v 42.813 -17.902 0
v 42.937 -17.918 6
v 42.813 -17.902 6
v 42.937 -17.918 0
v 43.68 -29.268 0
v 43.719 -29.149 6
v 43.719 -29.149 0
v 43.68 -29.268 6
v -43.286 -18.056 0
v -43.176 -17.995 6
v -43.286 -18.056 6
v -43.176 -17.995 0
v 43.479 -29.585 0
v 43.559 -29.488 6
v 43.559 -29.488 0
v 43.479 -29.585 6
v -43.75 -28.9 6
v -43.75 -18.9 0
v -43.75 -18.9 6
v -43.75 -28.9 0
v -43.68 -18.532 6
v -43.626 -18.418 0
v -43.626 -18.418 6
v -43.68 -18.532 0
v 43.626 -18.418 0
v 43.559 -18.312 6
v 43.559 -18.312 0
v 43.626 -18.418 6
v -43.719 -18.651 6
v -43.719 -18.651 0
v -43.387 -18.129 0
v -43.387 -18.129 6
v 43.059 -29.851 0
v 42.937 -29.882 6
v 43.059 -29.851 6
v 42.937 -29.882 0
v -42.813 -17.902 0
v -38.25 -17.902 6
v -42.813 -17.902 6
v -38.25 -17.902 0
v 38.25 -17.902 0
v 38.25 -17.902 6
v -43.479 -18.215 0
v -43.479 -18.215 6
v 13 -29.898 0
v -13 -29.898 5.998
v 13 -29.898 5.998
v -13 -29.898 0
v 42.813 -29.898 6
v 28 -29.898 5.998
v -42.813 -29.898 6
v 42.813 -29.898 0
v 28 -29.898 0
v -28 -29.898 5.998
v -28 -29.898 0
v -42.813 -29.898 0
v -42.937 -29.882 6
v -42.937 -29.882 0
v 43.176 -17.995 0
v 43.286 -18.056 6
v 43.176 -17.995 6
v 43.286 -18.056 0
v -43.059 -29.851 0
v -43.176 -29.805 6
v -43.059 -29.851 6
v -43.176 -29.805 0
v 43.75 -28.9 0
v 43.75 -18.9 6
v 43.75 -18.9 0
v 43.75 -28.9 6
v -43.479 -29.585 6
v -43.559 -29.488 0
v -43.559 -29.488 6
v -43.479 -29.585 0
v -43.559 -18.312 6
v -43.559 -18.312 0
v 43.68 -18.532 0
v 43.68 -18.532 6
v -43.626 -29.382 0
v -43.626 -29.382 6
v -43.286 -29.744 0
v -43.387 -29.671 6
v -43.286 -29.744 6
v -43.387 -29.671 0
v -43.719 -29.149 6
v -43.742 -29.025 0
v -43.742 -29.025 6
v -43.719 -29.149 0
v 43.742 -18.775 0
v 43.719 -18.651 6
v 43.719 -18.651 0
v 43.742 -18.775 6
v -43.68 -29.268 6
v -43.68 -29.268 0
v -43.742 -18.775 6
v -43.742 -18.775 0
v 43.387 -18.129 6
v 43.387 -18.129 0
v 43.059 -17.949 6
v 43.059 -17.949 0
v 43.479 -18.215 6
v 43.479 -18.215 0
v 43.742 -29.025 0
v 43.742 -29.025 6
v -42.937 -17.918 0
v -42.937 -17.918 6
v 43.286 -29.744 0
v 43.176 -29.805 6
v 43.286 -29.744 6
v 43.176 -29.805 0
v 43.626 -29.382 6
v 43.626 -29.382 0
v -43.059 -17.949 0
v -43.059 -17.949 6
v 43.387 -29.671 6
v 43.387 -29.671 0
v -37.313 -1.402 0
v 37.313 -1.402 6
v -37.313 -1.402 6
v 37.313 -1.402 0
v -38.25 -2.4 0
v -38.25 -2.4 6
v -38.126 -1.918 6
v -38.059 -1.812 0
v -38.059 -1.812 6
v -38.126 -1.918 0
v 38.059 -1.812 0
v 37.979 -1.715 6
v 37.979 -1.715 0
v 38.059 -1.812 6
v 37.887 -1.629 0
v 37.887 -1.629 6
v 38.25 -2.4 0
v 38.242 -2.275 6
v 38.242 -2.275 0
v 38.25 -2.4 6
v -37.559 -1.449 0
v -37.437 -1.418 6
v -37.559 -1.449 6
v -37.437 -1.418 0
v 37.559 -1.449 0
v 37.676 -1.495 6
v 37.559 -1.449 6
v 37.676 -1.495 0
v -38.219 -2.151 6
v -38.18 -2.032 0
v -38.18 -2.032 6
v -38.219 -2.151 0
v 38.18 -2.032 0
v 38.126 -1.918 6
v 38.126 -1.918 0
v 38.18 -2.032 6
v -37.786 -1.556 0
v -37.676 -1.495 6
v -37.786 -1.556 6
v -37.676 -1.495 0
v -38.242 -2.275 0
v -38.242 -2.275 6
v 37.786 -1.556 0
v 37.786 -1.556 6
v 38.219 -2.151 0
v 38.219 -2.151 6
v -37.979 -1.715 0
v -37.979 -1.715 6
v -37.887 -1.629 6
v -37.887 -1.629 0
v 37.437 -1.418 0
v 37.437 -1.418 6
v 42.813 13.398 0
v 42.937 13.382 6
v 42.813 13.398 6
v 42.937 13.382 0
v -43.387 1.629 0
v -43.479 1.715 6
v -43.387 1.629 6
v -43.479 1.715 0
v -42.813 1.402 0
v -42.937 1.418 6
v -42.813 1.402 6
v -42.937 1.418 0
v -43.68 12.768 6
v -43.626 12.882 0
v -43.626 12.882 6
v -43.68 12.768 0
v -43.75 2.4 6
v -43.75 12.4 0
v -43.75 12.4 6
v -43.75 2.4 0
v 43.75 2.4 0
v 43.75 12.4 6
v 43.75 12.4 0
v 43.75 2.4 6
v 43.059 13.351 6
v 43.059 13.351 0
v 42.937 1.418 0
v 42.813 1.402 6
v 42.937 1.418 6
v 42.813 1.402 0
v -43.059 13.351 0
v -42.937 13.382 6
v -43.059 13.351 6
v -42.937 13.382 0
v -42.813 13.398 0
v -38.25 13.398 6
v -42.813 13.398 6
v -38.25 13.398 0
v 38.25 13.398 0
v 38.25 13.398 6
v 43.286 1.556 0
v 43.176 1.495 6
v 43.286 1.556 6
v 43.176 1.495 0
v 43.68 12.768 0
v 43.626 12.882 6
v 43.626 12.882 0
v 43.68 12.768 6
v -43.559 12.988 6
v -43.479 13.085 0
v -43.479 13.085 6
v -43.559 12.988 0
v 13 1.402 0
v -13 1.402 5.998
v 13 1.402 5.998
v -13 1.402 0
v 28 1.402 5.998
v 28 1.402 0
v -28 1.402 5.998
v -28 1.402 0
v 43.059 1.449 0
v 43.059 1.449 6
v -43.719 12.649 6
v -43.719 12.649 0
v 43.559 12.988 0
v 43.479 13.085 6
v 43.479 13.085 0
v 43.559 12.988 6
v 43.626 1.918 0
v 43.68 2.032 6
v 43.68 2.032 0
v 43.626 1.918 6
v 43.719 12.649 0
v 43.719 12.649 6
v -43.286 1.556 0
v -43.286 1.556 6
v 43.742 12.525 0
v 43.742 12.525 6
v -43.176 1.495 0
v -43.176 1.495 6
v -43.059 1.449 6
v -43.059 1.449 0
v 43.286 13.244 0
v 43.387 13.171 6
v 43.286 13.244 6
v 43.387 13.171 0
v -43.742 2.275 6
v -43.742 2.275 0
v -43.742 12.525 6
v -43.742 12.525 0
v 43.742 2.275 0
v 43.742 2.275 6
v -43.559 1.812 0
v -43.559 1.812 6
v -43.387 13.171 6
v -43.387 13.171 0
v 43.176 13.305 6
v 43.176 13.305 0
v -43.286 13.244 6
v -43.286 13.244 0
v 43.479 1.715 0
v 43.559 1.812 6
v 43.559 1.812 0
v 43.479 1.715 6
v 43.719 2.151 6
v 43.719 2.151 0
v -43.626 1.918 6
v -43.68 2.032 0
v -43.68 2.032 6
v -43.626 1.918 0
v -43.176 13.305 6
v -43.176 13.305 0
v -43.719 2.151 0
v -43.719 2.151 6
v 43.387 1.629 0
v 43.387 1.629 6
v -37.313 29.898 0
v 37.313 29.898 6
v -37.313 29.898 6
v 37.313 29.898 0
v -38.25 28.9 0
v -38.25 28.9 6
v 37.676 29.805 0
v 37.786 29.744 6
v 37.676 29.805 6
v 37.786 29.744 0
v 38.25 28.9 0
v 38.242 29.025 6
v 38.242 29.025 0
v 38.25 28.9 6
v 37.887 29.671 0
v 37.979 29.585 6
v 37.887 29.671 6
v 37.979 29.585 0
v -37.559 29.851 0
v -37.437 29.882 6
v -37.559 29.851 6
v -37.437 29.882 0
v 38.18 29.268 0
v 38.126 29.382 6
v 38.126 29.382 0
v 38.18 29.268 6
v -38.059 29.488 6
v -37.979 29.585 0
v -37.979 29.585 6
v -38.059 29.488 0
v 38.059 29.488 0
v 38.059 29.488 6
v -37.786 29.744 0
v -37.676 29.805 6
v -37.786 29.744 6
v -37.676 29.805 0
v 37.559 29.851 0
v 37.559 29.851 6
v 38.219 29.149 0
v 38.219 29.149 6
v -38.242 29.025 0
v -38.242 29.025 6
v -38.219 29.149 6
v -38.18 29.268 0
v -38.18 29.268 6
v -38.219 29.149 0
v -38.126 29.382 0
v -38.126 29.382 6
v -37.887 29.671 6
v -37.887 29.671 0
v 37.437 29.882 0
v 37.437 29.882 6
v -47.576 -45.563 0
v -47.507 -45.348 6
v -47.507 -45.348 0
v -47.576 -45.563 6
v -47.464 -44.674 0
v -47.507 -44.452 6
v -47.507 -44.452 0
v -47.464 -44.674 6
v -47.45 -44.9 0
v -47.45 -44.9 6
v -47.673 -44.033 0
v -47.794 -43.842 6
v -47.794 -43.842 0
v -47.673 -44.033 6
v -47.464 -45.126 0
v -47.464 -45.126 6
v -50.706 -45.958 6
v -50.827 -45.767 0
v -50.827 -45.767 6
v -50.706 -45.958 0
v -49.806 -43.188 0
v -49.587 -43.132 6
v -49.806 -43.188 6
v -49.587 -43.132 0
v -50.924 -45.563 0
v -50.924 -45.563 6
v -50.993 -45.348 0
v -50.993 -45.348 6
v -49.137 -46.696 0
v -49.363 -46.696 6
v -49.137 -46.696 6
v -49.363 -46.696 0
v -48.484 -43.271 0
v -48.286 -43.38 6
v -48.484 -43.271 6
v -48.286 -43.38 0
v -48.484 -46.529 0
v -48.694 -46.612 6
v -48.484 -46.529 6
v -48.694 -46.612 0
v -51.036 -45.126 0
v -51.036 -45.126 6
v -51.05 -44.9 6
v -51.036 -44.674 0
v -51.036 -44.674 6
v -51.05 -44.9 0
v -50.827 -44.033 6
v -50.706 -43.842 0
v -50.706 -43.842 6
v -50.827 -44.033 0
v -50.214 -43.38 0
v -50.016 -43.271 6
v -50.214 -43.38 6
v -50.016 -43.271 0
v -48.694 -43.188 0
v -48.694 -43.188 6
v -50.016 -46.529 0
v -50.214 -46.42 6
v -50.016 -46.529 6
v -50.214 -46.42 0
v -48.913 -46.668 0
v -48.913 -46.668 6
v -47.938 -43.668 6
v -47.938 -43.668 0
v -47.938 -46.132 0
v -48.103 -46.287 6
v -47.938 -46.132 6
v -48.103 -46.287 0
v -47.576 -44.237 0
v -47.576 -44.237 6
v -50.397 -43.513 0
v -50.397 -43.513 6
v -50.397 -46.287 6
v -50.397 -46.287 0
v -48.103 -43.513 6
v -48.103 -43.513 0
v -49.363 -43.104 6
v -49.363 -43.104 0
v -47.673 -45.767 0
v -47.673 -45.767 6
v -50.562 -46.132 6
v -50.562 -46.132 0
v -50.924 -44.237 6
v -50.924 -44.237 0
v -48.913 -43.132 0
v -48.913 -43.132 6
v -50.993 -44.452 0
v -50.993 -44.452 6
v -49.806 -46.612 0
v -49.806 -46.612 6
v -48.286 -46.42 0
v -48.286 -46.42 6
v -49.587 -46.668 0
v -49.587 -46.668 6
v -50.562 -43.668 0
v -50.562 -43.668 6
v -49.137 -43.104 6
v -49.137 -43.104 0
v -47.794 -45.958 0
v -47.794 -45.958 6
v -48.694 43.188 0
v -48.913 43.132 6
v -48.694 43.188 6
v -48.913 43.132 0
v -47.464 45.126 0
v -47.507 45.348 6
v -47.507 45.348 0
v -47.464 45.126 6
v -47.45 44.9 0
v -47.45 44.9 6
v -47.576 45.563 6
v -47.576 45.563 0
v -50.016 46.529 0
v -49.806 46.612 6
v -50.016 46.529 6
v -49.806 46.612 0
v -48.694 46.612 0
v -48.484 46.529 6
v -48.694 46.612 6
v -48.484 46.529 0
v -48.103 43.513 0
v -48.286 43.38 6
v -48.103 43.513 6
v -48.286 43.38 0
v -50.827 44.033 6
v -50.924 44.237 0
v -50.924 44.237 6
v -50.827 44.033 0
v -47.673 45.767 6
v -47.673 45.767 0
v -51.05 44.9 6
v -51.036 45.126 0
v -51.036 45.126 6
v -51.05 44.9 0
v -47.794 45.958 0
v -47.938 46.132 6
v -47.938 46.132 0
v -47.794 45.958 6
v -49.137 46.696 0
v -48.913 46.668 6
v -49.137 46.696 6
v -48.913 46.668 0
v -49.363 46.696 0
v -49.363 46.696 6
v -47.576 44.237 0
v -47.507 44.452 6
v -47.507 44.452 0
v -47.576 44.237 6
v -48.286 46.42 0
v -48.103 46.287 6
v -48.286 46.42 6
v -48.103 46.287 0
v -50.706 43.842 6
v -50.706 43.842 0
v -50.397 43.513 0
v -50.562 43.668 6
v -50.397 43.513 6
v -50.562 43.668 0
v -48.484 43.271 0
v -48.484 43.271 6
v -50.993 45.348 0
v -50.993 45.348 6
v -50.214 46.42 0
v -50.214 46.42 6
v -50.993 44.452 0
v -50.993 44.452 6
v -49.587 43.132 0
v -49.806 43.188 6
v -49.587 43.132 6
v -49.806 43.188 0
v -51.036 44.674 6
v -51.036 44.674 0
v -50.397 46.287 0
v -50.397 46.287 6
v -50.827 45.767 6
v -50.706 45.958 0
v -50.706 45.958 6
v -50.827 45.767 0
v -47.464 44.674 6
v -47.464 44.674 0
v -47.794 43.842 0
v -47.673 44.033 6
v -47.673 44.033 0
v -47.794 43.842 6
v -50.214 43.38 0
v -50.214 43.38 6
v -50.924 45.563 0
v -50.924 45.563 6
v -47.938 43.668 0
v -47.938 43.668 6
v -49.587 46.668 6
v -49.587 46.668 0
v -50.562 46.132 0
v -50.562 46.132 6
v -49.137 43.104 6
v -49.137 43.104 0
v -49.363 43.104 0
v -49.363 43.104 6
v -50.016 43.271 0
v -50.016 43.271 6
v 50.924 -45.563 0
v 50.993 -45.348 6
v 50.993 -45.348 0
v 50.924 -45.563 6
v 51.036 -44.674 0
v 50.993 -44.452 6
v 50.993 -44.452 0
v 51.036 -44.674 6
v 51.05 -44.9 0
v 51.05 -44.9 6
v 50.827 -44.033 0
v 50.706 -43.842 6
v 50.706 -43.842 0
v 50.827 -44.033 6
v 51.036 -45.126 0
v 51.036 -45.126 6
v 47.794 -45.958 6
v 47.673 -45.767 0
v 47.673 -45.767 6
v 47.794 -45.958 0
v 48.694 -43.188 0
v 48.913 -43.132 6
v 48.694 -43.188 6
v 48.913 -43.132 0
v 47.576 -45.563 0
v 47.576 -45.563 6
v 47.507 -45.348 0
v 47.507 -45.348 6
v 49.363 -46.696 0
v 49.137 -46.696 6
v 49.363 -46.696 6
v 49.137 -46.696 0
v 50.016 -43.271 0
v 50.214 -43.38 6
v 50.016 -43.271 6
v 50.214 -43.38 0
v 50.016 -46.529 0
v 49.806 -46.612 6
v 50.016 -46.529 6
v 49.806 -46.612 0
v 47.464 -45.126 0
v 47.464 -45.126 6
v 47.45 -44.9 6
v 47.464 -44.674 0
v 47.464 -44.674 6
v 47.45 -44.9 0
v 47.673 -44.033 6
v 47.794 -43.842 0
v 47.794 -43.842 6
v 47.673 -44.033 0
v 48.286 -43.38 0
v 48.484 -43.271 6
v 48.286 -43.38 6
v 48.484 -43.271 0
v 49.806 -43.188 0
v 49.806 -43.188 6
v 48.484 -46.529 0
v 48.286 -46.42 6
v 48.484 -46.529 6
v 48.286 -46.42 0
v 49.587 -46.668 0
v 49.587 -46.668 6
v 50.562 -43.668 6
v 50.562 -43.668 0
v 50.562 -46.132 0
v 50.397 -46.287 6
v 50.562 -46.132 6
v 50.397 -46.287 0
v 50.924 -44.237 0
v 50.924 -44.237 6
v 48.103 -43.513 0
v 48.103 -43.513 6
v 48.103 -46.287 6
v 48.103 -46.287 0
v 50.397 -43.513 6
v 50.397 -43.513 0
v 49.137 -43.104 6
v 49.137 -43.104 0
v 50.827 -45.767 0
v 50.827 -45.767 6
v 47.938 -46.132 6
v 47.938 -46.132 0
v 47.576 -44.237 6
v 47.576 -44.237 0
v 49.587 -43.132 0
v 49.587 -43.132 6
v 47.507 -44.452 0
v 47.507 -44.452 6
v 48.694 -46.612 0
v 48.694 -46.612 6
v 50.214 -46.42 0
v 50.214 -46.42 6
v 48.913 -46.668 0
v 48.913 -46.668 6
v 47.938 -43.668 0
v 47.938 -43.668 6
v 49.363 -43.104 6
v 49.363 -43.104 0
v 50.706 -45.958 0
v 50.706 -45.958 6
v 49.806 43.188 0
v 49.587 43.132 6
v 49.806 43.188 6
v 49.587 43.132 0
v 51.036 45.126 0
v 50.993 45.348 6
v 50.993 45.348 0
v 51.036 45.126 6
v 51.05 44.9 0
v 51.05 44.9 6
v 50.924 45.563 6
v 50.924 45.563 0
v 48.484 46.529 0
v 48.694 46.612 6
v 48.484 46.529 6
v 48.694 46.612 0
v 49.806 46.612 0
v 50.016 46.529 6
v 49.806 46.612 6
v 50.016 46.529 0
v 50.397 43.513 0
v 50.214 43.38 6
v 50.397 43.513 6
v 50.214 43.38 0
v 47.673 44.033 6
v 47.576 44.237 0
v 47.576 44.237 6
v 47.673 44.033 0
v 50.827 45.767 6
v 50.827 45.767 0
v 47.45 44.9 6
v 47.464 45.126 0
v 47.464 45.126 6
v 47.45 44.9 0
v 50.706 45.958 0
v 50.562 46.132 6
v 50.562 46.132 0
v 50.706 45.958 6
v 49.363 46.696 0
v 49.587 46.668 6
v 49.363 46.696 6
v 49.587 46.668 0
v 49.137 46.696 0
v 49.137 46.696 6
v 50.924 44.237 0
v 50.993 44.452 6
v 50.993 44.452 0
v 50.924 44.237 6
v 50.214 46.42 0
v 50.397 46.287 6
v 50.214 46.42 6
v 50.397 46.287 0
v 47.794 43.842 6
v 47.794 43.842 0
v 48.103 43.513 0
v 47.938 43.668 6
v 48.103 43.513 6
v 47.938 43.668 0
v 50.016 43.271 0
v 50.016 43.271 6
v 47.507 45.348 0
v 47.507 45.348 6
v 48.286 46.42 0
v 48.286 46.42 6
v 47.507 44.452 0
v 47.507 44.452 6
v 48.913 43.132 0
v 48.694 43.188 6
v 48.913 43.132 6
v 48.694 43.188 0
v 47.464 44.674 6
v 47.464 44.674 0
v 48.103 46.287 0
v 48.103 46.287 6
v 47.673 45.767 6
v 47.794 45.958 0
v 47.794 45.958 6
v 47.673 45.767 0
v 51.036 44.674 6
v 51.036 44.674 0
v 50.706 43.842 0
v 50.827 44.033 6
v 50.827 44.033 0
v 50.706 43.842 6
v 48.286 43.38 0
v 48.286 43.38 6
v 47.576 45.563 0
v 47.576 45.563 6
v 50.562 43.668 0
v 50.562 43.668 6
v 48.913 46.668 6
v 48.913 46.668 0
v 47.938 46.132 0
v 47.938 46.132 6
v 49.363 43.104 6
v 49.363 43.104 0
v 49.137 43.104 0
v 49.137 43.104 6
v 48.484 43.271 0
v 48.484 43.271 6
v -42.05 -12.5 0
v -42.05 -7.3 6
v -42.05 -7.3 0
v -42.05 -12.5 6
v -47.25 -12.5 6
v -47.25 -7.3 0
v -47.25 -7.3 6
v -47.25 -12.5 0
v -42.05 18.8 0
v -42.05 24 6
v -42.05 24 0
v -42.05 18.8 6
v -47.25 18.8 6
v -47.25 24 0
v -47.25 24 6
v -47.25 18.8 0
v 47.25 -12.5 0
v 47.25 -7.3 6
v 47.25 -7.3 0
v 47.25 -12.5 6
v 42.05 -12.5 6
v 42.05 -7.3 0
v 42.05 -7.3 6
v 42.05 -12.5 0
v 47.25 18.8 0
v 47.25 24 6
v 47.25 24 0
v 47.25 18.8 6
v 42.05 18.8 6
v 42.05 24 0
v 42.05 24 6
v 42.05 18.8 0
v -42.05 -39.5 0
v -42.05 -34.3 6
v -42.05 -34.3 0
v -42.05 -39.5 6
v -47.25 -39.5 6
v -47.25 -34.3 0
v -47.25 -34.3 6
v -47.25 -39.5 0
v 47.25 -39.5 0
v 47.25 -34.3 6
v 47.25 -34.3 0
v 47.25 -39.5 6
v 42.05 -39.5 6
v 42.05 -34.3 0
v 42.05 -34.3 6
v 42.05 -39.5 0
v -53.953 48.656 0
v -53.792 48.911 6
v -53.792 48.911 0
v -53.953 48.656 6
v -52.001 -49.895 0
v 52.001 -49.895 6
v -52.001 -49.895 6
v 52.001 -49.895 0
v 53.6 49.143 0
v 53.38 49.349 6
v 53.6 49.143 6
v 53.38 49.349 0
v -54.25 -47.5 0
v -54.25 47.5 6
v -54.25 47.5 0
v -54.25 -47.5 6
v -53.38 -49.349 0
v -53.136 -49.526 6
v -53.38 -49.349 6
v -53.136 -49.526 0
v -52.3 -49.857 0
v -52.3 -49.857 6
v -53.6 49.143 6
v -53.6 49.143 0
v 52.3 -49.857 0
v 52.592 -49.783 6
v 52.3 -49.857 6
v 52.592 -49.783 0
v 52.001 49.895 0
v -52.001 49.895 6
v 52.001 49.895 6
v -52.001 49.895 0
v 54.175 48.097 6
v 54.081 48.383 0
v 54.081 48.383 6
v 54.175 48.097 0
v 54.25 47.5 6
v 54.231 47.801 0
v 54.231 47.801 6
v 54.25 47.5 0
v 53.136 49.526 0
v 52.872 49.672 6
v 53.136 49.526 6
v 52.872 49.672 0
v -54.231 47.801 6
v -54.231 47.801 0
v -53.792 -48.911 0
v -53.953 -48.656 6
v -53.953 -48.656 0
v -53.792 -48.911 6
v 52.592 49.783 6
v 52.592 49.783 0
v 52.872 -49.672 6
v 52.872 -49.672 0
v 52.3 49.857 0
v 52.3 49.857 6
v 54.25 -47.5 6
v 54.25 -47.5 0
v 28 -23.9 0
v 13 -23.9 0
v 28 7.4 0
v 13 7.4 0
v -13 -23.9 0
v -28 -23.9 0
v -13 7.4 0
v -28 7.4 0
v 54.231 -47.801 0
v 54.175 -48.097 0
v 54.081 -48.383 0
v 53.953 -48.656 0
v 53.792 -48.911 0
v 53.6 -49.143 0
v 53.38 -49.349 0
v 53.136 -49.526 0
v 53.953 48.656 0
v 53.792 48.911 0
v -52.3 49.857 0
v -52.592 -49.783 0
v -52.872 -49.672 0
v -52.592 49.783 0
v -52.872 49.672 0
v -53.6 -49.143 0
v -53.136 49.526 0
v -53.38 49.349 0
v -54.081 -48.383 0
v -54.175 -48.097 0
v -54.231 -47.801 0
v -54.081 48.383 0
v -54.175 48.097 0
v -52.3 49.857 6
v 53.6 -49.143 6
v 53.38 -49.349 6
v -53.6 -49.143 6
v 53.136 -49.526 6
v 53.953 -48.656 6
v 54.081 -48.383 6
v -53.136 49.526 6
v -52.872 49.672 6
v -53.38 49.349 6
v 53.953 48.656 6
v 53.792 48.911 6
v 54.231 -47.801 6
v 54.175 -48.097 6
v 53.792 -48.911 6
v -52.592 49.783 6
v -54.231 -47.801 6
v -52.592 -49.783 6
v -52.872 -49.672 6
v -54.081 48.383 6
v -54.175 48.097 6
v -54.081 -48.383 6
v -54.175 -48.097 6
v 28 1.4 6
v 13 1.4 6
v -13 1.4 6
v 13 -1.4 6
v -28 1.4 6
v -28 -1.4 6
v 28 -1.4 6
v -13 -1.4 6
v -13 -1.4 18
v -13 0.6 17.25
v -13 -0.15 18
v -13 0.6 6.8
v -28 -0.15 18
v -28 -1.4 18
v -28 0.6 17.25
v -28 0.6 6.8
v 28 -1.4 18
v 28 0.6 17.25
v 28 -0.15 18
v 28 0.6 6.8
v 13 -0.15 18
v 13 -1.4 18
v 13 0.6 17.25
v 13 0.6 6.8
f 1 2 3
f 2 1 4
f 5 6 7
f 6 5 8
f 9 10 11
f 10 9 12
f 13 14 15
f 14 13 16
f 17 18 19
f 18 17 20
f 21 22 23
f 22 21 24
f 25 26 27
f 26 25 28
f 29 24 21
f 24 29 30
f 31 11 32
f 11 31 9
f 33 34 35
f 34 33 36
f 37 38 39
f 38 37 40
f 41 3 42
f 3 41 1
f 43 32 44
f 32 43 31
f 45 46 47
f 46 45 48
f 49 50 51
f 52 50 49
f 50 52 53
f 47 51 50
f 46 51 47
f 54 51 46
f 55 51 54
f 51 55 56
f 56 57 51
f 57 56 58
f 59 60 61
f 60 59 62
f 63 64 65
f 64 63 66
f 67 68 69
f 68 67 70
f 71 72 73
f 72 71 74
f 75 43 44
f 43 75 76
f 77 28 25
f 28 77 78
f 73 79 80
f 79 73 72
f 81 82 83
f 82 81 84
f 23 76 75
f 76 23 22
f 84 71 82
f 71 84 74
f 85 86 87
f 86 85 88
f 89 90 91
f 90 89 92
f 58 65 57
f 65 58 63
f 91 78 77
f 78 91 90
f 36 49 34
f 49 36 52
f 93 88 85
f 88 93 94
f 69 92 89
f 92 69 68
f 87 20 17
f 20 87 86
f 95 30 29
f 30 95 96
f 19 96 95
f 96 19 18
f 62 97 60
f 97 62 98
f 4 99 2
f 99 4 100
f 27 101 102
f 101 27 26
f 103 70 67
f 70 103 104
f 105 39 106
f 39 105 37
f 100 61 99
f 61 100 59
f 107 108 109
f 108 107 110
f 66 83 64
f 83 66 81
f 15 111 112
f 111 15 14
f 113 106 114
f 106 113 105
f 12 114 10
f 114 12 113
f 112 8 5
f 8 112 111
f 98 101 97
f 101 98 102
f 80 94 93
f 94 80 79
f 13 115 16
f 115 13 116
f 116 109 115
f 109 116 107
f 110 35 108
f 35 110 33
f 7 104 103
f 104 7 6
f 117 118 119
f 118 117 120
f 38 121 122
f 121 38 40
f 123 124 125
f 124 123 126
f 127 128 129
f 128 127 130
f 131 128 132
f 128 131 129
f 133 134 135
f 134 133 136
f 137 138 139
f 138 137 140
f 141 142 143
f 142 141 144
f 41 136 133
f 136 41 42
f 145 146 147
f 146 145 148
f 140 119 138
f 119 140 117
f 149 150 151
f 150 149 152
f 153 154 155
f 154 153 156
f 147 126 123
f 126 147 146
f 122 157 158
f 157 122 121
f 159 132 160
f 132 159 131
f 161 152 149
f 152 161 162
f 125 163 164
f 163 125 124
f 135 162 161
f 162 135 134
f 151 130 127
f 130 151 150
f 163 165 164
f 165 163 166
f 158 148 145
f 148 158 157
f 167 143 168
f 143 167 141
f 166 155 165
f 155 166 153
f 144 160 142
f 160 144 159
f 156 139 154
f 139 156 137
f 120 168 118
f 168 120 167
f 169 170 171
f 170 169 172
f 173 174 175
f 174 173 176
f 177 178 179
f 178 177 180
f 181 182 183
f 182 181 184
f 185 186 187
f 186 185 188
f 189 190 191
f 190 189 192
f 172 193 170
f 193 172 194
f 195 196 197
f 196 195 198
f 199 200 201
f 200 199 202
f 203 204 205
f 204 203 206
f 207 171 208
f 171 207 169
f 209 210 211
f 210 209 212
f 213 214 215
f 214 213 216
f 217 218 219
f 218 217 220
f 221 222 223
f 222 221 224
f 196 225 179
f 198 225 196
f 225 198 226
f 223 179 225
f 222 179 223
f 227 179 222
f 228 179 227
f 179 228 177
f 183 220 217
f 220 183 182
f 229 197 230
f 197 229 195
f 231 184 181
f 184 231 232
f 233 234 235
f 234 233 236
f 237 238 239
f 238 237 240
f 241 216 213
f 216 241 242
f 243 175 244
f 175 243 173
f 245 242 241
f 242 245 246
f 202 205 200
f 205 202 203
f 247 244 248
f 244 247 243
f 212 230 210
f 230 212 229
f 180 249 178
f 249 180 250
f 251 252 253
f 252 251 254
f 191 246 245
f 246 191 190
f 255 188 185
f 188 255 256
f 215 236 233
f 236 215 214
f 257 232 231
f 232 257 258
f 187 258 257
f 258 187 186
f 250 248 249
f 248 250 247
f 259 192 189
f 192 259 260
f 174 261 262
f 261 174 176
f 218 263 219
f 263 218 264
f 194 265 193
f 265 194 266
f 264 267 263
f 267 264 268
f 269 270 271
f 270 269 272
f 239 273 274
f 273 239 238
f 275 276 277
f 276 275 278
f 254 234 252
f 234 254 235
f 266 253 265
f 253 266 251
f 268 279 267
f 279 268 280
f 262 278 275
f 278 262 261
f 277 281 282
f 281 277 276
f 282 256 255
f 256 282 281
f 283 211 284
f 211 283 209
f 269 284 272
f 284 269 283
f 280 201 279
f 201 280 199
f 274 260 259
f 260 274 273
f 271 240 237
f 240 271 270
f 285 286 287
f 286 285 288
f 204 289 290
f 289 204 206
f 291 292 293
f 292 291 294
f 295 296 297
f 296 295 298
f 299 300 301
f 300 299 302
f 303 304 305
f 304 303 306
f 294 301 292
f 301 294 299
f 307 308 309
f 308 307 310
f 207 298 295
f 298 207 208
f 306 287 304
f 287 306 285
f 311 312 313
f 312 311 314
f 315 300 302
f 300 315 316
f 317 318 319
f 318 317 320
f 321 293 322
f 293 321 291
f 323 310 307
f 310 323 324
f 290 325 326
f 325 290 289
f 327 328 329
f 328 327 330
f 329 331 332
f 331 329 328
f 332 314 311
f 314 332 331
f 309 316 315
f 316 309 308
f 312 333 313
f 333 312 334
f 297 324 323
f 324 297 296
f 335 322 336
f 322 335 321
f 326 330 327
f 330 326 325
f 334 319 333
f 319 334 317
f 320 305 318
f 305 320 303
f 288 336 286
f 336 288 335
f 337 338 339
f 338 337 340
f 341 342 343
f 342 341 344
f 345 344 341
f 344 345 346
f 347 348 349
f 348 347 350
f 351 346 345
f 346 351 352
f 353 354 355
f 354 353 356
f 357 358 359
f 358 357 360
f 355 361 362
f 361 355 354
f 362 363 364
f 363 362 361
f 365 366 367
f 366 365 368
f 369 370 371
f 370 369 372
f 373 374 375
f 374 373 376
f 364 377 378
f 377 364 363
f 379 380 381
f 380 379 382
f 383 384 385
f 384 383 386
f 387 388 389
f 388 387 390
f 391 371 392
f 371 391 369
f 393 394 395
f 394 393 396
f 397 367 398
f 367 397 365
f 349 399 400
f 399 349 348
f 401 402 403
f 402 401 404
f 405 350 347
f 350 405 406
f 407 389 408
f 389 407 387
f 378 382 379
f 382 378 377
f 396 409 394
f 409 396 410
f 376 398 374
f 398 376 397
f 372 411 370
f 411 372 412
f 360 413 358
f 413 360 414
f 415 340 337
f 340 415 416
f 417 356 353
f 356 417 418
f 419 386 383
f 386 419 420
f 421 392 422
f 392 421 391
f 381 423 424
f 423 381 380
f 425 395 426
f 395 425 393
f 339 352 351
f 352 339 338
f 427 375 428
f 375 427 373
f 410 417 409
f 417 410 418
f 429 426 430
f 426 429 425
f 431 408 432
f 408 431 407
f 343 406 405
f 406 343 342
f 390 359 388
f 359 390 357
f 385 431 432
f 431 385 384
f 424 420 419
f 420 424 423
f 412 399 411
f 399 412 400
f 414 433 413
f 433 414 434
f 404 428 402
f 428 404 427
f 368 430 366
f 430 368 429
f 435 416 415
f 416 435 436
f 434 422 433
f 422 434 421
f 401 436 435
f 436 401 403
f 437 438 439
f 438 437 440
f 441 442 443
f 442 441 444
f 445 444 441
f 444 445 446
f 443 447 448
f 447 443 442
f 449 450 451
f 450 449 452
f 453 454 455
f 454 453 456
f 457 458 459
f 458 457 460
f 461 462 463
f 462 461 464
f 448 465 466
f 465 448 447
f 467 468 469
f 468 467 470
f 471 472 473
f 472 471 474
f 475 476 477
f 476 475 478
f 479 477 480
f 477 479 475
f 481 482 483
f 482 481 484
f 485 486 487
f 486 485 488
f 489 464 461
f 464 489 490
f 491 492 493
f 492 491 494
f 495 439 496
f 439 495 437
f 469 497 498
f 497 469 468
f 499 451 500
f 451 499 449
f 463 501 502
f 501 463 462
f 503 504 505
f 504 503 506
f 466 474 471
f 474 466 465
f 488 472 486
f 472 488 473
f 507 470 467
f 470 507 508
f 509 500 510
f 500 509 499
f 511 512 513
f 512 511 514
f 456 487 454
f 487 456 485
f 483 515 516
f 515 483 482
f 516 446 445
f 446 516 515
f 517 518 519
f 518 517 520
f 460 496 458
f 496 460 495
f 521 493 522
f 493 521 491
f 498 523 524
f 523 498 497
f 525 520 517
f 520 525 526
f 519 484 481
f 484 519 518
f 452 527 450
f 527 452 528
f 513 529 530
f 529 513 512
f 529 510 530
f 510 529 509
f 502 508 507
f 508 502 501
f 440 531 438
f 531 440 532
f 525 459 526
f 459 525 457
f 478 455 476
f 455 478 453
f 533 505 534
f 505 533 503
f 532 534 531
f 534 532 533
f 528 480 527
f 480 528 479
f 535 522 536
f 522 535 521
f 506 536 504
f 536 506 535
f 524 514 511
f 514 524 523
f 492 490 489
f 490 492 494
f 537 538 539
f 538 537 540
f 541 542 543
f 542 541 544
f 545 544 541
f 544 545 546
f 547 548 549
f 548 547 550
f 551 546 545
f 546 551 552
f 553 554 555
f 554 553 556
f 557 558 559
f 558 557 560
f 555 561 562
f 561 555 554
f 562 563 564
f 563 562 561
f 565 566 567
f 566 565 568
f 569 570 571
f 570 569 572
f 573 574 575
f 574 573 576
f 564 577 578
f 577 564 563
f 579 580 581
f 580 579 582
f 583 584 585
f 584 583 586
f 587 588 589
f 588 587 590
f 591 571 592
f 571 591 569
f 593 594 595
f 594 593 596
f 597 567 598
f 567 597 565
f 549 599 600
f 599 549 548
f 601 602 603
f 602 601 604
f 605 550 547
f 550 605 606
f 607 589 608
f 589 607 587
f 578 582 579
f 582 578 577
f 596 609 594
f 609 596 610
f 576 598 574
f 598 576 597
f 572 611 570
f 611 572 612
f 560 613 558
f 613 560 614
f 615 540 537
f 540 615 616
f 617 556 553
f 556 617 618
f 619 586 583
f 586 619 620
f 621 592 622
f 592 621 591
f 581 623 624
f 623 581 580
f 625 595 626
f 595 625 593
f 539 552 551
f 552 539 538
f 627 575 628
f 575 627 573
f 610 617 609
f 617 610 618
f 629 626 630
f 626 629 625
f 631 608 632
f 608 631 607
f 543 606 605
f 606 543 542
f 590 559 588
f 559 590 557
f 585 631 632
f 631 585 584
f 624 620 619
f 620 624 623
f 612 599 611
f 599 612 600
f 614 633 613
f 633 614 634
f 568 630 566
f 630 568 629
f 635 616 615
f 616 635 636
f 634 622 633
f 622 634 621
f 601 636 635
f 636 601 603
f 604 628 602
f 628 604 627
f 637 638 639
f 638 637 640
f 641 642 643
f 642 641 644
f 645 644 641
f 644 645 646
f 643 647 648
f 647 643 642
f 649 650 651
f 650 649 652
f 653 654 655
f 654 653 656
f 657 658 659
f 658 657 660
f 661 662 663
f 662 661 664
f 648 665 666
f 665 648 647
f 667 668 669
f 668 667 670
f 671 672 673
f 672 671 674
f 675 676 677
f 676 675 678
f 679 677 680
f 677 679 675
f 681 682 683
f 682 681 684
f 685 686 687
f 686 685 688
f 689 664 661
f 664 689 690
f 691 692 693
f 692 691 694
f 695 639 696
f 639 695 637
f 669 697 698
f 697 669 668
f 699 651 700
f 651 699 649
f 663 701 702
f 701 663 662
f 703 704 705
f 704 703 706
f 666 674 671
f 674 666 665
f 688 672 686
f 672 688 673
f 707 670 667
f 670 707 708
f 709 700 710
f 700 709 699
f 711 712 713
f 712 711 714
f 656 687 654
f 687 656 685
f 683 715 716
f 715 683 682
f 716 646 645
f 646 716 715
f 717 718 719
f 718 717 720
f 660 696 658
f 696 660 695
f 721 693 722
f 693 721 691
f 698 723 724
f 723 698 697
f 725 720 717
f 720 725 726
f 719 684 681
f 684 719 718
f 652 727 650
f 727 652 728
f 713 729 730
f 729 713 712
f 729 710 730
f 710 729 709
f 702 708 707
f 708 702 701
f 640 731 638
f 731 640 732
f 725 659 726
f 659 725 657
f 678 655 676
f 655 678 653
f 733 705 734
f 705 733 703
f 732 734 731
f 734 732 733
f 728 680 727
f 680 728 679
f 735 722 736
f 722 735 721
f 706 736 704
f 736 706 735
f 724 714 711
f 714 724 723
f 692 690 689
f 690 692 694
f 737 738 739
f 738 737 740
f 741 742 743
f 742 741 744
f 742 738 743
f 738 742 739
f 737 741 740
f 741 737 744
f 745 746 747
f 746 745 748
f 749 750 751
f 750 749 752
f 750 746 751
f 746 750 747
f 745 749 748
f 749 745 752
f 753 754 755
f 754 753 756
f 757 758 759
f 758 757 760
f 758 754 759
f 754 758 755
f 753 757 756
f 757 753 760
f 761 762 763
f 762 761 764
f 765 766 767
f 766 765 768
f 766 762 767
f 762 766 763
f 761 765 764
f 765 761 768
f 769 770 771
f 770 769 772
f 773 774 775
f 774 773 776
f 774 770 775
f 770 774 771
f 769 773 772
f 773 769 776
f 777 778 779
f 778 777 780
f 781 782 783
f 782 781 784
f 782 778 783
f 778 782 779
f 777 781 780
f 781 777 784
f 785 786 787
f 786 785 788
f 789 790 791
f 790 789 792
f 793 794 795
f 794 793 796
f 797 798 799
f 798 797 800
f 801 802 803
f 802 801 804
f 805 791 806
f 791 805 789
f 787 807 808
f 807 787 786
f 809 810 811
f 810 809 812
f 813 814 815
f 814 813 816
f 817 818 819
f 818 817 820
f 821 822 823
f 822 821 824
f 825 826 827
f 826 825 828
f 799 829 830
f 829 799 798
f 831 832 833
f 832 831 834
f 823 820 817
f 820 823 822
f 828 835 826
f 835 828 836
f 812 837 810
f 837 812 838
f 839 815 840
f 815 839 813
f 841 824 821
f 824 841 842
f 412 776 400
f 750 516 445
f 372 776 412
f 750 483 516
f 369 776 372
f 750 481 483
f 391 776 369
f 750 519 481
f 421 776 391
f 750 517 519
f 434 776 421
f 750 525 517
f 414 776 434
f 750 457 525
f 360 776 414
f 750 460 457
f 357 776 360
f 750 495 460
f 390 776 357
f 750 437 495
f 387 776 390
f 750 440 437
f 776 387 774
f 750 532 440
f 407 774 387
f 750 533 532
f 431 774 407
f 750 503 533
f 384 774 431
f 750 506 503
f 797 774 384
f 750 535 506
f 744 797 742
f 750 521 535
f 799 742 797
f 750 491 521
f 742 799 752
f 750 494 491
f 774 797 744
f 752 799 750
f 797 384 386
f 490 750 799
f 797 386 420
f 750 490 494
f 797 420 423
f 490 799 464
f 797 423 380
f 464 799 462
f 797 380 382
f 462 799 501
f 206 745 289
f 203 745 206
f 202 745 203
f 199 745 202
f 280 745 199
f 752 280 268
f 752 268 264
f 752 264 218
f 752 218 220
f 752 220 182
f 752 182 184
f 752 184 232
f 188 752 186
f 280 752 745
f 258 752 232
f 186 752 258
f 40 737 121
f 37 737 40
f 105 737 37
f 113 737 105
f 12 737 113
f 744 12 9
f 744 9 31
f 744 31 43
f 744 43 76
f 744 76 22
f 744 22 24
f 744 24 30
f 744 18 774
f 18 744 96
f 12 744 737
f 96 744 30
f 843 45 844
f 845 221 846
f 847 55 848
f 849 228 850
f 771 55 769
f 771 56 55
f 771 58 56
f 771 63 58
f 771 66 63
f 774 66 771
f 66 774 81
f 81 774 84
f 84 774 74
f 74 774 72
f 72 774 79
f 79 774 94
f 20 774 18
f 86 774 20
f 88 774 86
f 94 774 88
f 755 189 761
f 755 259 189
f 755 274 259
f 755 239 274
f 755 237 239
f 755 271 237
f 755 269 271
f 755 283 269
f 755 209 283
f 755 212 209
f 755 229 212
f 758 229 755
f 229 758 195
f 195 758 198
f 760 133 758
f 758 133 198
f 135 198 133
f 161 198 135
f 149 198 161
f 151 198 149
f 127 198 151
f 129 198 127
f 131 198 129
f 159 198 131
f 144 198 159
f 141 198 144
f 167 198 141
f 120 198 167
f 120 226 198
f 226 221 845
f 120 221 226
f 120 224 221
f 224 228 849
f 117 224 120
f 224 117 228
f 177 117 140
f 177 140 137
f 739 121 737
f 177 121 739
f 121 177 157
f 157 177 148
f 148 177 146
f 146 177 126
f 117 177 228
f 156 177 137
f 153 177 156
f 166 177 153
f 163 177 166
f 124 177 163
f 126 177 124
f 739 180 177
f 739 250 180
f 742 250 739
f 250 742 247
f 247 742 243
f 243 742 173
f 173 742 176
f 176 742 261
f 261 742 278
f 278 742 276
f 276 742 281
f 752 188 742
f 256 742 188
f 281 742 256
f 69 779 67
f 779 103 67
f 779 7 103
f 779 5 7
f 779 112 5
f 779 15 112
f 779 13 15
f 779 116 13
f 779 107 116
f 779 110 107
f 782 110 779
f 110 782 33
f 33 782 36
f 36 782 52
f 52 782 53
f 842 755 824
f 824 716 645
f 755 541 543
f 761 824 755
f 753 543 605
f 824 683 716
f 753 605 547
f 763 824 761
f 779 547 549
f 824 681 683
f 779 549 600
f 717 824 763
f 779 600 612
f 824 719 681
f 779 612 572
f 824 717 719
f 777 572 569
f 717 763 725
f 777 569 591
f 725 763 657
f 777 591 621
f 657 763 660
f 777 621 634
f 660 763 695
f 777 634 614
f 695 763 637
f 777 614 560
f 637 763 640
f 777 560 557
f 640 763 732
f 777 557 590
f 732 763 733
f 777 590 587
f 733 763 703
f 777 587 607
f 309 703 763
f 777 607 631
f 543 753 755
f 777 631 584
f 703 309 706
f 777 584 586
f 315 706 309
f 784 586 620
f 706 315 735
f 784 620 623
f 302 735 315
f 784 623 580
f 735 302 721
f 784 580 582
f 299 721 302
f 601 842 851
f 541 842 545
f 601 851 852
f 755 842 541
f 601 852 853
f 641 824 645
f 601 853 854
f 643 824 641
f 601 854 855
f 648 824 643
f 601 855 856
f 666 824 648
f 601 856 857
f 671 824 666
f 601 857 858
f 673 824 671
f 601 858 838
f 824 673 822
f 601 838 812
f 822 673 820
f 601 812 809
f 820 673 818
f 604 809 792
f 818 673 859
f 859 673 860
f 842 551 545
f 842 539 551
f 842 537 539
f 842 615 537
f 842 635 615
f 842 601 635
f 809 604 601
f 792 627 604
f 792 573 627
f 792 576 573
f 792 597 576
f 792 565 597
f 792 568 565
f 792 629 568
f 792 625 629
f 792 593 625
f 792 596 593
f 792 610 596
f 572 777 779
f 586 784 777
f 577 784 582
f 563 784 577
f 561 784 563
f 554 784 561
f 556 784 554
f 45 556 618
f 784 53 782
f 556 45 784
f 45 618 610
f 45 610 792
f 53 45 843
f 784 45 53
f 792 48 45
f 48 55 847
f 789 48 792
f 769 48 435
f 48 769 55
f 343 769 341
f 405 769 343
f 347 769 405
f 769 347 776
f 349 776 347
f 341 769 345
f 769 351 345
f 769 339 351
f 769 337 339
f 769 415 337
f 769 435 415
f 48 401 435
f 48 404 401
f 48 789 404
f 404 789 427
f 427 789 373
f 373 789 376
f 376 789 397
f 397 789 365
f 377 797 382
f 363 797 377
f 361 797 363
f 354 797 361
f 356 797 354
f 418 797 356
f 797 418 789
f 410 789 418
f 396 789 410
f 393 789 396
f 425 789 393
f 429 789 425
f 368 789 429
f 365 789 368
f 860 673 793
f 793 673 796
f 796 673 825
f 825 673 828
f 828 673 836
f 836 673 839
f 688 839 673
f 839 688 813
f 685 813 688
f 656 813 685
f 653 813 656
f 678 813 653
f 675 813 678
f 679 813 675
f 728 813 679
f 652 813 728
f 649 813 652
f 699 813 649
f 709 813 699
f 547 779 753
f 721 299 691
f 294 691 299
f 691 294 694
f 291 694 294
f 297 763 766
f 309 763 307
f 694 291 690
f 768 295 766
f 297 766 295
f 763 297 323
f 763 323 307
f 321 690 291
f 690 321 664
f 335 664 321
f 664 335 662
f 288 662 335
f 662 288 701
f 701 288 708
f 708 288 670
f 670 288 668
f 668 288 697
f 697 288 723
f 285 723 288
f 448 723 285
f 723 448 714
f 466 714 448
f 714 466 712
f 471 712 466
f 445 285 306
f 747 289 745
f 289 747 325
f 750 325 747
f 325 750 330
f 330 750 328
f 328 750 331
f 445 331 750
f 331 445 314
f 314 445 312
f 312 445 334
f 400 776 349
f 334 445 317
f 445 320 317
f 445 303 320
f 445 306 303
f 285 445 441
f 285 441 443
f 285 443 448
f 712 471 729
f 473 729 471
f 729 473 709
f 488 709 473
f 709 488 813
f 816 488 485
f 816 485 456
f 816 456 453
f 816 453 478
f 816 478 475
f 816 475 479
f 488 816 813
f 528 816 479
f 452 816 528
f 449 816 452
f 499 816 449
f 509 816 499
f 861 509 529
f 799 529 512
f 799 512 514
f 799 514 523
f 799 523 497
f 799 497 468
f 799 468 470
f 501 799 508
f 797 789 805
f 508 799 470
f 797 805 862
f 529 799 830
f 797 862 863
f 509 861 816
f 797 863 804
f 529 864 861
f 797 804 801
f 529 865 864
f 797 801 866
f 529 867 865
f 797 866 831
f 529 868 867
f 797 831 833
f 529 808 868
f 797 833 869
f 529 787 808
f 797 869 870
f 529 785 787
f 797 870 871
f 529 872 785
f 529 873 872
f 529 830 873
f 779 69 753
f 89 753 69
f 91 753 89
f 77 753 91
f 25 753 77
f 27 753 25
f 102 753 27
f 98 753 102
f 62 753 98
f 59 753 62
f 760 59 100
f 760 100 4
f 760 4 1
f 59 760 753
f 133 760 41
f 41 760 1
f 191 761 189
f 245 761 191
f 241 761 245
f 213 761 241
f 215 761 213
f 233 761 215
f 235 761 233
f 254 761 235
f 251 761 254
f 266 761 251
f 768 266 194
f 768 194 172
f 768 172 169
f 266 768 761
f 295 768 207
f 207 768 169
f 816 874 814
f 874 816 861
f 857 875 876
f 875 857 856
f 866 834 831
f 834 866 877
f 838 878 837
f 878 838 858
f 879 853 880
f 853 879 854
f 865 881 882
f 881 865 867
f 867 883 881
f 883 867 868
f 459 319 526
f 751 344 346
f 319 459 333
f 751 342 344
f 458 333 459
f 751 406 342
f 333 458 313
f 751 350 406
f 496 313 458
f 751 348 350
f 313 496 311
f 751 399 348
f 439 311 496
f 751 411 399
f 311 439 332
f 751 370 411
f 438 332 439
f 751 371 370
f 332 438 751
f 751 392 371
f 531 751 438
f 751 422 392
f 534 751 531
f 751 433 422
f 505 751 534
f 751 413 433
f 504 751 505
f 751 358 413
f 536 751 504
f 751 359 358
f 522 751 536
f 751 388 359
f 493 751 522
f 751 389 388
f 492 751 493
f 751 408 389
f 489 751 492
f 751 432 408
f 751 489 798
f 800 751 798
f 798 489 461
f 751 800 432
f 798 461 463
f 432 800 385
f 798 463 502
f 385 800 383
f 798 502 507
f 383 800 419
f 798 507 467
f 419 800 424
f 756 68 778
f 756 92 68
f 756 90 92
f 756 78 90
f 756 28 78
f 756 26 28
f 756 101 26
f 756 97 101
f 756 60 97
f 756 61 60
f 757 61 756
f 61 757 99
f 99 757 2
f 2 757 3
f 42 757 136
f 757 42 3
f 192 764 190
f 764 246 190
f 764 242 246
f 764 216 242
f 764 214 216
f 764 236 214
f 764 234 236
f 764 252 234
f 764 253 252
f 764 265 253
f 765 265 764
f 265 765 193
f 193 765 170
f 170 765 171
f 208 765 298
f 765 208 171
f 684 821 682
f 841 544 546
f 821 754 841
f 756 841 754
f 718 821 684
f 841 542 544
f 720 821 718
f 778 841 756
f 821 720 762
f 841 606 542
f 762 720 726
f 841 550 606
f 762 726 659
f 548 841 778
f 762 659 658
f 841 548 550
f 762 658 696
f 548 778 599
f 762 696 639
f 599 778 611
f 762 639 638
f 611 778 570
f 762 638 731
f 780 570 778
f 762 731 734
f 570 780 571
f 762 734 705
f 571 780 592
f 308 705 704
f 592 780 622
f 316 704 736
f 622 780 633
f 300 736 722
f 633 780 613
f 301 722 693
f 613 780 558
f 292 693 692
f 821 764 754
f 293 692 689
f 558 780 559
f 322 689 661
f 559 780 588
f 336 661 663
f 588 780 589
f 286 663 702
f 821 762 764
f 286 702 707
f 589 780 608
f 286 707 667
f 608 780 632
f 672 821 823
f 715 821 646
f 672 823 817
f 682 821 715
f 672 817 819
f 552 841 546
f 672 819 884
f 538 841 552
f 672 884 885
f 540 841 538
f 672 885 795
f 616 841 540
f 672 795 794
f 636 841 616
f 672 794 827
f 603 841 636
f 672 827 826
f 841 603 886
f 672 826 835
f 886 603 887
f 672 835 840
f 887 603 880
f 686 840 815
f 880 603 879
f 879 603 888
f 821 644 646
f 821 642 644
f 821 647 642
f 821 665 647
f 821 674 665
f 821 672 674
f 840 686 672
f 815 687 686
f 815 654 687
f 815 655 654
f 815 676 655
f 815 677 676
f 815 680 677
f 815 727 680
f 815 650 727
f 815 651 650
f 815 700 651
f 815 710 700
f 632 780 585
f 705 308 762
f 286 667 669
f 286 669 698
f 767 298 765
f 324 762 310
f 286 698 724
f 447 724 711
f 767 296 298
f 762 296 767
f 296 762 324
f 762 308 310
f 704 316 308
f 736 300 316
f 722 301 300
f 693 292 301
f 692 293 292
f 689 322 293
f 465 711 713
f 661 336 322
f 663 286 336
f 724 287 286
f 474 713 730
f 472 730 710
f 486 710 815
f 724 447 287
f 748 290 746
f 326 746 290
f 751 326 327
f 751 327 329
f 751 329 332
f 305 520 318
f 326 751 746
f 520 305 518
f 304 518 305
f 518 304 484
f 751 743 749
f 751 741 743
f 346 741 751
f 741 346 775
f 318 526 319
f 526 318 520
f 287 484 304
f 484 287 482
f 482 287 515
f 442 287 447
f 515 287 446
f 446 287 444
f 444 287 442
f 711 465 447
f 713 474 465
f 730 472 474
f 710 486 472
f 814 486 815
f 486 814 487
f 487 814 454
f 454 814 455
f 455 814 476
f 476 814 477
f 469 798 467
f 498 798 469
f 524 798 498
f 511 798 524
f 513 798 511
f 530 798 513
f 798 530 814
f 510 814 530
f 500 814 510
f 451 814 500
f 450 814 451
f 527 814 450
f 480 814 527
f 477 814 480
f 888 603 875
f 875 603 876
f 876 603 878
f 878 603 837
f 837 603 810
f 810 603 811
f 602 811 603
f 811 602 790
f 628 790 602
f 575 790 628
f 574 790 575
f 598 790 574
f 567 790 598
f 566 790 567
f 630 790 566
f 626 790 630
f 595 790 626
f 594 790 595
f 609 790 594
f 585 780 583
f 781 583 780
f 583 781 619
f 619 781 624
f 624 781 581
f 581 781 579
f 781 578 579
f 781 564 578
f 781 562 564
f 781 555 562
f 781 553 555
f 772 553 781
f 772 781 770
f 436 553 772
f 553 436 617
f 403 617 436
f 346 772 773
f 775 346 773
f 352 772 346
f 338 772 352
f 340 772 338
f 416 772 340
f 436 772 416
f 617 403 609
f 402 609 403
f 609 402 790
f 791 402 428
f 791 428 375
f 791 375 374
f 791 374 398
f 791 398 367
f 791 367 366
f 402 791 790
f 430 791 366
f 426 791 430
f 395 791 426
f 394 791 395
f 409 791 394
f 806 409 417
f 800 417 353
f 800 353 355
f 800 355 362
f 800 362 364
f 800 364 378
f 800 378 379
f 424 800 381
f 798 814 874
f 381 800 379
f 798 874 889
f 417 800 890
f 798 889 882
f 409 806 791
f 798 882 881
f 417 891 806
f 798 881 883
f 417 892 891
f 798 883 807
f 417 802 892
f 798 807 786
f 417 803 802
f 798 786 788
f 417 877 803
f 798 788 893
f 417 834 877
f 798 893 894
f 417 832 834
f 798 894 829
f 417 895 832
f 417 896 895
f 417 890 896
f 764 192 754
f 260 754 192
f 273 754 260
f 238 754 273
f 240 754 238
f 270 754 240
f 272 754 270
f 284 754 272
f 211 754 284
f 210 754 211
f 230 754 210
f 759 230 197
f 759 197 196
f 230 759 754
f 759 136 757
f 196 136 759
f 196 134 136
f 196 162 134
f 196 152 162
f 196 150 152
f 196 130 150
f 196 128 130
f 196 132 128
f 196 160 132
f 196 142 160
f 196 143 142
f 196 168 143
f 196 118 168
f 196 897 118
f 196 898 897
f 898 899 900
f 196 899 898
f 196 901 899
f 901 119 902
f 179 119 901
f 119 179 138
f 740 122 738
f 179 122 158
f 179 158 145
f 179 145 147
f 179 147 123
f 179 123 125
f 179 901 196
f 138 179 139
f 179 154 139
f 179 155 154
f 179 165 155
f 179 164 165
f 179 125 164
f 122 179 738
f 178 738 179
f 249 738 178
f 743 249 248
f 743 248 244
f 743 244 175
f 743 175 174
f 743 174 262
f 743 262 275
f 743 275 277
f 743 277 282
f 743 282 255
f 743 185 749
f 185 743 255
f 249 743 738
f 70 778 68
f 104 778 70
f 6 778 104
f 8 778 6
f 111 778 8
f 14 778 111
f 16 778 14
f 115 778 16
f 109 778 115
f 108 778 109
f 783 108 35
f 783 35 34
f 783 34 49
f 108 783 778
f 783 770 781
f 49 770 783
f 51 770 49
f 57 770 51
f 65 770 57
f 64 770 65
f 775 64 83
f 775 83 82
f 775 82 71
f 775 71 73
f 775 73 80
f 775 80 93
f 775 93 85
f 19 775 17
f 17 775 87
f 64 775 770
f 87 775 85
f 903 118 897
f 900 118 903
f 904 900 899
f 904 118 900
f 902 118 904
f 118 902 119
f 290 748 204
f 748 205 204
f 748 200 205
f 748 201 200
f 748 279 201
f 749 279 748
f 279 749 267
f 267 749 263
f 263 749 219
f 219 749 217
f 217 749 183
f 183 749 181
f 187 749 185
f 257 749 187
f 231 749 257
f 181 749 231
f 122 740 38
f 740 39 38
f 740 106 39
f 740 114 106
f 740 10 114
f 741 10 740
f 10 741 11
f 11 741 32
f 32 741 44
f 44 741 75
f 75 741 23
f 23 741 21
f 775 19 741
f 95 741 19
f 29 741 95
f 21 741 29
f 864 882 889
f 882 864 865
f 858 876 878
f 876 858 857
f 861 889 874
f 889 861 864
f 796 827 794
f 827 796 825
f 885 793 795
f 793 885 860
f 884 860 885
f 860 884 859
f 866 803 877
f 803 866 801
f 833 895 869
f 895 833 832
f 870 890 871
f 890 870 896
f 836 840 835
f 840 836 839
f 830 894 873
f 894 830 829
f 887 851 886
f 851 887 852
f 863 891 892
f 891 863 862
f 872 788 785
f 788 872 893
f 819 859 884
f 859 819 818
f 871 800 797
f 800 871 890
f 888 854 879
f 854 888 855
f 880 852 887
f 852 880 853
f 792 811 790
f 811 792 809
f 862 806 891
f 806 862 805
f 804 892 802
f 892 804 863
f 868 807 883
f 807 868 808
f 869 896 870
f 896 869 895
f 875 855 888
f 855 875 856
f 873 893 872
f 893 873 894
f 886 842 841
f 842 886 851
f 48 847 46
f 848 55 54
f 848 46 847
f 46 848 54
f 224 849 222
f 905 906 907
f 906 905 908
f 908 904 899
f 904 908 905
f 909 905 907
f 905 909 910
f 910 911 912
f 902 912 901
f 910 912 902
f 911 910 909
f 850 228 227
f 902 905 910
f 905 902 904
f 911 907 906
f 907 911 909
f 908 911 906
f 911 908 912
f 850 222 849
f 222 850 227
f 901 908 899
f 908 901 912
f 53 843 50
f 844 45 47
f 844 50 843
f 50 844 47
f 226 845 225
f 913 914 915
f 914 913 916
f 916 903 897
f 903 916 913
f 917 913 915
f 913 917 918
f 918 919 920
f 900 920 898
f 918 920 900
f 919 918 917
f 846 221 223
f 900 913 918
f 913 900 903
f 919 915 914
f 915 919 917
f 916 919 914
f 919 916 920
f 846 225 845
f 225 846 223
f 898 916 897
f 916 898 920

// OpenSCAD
$fn = 50;

difference() {
	union() {
		translate(v = [0, 0, 0]) {
			rotate(a = [0, 0, 0]) {
				difference() {
					union() {
						translate(v = [0, 0, 0]) {
							rotate(a = [0, 0, 0]) {
								difference() {
									union() {
										hull() {
											translate(v = [-51.8500000005, 47.5000000005, 0]) {
												cylinder(h = 6.0, r = 2.4);
											}
											translate(v = [51.8500000005, 47.5000000005, 0]) {
												cylinder(h = 6.0, r = 2.4);
											}
											translate(v = [-51.8500000005, -47.5000000005, 0]) {
												cylinder(h = 6.0, r = 2.4);
											}
											translate(v = [51.8500000005, -47.5000000005, 0]) {
												cylinder(h = 6.0, r = 2.4);
											}
										}
									}
									union() {
										translate(v = [0.0, -23.900000000000006, -0.1]) {
											hull() {
												translate(v = [-42.75, 5.0, 0]) {
													cylinder(h = 18.2, r = 1.0);
												}
												translate(v = [42.75, 5.0, 0]) {
													cylinder(h = 18.2, r = 1.0);
												}
												translate(v = [-42.75, -5.0, 0]) {
													cylinder(h = 18.2, r = 1.0);
												}
												translate(v = [42.75, -5.0, 0]) {
													cylinder(h = 18.2, r = 1.0);
												}
											}
										}
										translate(v = [0.0, -15.650000000000006, -0.1]) {
											hull() {
												translate(v = [-37.25, 13.25, 0]) {
													cylinder(h = 18.2, r = 1.0);
												}
												translate(v = [37.25, 13.25, 0]) {
													cylinder(h = 18.2, r = 1.0);
												}
												translate(v = [-37.25, -13.25, 0]) {
													cylinder(h = 18.2, r = 1.0);
												}
												translate(v = [37.25, -13.25, 0]) {
													cylinder(h = 18.2, r = 1.0);
												}
											}
										}
										translate(v = [0.0, 7.399999999999995, -0.1]) {
											hull() {
												translate(v = [-42.75, 5.0, 0]) {
													cylinder(h = 18.2, r = 1.0);
												}
												translate(v = [42.75, 5.0, 0]) {
													cylinder(h = 18.2, r = 1.0);
												}
												translate(v = [-42.75, -5.0, 0]) {
													cylinder(h = 18.2, r = 1.0);
												}
												translate(v = [42.75, -5.0, 0]) {
													cylinder(h = 18.2, r = 1.0);
												}
											}
										}
										translate(v = [0.0, 15.649999999999995, -0.1]) {
											hull() {
												translate(v = [-37.25, 13.25, 0]) {
													cylinder(h = 18.2, r = 1.0);
												}
												translate(v = [37.25, 13.25, 0]) {
													cylinder(h = 18.2, r = 1.0);
												}
												translate(v = [-37.25, -13.25, 0]) {
													cylinder(h = 18.2, r = 1.0);
												}
												translate(v = [37.25, -13.25, 0]) {
													cylinder(h = 18.2, r = 1.0);
												}
											}
										}
										translate(v = [-49.2500000005, -44.9000000005, -0.1]) {
											cylinder(h = 6.2, r = 1.8);
										}
										translate(v = [-49.2500000005, 44.9000000005, -0.1]) {
											cylinder(h = 6.2, r = 1.8);
										}
										translate(v = [49.2500000005, -44.9000000005, -0.1]) {
											cylinder(h = 6.2, r = 1.8);
										}
										translate(v = [49.2500000005, 44.9000000005, -0.1]) {
											cylinder(h = 6.2, r = 1.8);
										}
										translate(v = [-47.25, -12.500000000000005, -0.1]) {
											cube(size = [5.2, 5.2, 6.2]);
										}
										translate(v = [-47.25, 18.799999999999994, -0.1]) {
											cube(size = [5.2, 5.2, 6.2]);
										}
										translate(v = [42.05, -12.500000000000005, -0.1]) {
											cube(size = [5.2, 5.2, 6.2]);
										}
										translate(v = [42.05, 18.799999999999994, -0.1]) {
											cube(size = [5.2, 5.2, 6.2]);
										}
										translate(v = [-47.25, -39.5, -0.1]) {
											cube(size = [5.2, 5.2, 6.2]);
										}
										translate(v = [42.05, -39.5, -0.1]) {
											cube(size = [5.2, 5.2, 6.2]);
										}
									}
								}
							}
						}
						translate(v = [0, 0, 0]) {
							rotate(a = [0, 0, 0]) {
								difference() {
									union() {
										translate(v = [-28.0, -31.7, 0]) {
											cube(size = [15.0, 7.8, 6.0]);
										}
									}
									union() {
										translate(v = [-28.1, -31.7, 0]) {
											rotate(a = [90, 0, 90]) {
												linear_extrude(height = 15.2) {
													polygon(points = [[7.8999999999999995, -0.1], [7.8999999999999995, 6.1], [1.6999999999999997, 6.1]]);
												}
											}
										}
									}
								}
							}
						}
						translate(v = [0, 0, 0]) {
							rotate(a = [0, 0, 0]) {
								difference() {
									union() {
										translate(v = [-28.0, -1.3999999999999986, 0]) {
											cube(size = [15.0, 8.8, 18.0]);
										}
									}
									union() {
										translate(v = [-28.1, -1.3999999999999986, 0]) {
											rotate(a = [90, 0, 90]) {
												linear_extrude(height = 15.2) {
													polygon(points = [[8.9, -0.1], [8.9, 18.1], [1.15, 18.1], [2.0, 17.25], [2.0, 6.800000000000001]]);
												}
											}
										}
									}
								}
							}
						}
						translate(v = [0, 0, 0]) {
							rotate(a = [0, 0, 0]) {
								difference() {
									union() {
										translate(v = [13.0, -31.7, 0]) {
											cube(size = [15.0, 7.8, 6.0]);
										}
									}
									union() {
										translate(v = [12.9, -31.7, 0]) {
											rotate(a = [90, 0, 90]) {
												linear_extrude(height = 15.2) {
													polygon(points = [[7.8999999999999995, -0.1], [7.8999999999999995, 6.1], [1.6999999999999997, 6.1]]);
												}
											}
										}
									}
								}
							}
						}
						translate(v = [0, 0, 0]) {
							rotate(a = [0, 0, 0]) {
								difference() {
									union() {
										translate(v = [13.0, -1.3999999999999986, 0]) {
											cube(size = [15.0, 8.8, 18.0]);
										}
									}
									union() {
										translate(v = [12.9, -1.3999999999999986, 0]) {
											rotate(a = [90, 0, 90]) {
												linear_extrude(height = 15.2) {
													polygon(points = [[8.9, -0.1], [8.9, 18.1], [1.15, 18.1], [2.0, 17.25], [2.0, 6.800000000000001]]);
												}
											}
										}
									}
								}
							}
						}
					}
					union();
				}
			}
		}
	}
	union();
}
